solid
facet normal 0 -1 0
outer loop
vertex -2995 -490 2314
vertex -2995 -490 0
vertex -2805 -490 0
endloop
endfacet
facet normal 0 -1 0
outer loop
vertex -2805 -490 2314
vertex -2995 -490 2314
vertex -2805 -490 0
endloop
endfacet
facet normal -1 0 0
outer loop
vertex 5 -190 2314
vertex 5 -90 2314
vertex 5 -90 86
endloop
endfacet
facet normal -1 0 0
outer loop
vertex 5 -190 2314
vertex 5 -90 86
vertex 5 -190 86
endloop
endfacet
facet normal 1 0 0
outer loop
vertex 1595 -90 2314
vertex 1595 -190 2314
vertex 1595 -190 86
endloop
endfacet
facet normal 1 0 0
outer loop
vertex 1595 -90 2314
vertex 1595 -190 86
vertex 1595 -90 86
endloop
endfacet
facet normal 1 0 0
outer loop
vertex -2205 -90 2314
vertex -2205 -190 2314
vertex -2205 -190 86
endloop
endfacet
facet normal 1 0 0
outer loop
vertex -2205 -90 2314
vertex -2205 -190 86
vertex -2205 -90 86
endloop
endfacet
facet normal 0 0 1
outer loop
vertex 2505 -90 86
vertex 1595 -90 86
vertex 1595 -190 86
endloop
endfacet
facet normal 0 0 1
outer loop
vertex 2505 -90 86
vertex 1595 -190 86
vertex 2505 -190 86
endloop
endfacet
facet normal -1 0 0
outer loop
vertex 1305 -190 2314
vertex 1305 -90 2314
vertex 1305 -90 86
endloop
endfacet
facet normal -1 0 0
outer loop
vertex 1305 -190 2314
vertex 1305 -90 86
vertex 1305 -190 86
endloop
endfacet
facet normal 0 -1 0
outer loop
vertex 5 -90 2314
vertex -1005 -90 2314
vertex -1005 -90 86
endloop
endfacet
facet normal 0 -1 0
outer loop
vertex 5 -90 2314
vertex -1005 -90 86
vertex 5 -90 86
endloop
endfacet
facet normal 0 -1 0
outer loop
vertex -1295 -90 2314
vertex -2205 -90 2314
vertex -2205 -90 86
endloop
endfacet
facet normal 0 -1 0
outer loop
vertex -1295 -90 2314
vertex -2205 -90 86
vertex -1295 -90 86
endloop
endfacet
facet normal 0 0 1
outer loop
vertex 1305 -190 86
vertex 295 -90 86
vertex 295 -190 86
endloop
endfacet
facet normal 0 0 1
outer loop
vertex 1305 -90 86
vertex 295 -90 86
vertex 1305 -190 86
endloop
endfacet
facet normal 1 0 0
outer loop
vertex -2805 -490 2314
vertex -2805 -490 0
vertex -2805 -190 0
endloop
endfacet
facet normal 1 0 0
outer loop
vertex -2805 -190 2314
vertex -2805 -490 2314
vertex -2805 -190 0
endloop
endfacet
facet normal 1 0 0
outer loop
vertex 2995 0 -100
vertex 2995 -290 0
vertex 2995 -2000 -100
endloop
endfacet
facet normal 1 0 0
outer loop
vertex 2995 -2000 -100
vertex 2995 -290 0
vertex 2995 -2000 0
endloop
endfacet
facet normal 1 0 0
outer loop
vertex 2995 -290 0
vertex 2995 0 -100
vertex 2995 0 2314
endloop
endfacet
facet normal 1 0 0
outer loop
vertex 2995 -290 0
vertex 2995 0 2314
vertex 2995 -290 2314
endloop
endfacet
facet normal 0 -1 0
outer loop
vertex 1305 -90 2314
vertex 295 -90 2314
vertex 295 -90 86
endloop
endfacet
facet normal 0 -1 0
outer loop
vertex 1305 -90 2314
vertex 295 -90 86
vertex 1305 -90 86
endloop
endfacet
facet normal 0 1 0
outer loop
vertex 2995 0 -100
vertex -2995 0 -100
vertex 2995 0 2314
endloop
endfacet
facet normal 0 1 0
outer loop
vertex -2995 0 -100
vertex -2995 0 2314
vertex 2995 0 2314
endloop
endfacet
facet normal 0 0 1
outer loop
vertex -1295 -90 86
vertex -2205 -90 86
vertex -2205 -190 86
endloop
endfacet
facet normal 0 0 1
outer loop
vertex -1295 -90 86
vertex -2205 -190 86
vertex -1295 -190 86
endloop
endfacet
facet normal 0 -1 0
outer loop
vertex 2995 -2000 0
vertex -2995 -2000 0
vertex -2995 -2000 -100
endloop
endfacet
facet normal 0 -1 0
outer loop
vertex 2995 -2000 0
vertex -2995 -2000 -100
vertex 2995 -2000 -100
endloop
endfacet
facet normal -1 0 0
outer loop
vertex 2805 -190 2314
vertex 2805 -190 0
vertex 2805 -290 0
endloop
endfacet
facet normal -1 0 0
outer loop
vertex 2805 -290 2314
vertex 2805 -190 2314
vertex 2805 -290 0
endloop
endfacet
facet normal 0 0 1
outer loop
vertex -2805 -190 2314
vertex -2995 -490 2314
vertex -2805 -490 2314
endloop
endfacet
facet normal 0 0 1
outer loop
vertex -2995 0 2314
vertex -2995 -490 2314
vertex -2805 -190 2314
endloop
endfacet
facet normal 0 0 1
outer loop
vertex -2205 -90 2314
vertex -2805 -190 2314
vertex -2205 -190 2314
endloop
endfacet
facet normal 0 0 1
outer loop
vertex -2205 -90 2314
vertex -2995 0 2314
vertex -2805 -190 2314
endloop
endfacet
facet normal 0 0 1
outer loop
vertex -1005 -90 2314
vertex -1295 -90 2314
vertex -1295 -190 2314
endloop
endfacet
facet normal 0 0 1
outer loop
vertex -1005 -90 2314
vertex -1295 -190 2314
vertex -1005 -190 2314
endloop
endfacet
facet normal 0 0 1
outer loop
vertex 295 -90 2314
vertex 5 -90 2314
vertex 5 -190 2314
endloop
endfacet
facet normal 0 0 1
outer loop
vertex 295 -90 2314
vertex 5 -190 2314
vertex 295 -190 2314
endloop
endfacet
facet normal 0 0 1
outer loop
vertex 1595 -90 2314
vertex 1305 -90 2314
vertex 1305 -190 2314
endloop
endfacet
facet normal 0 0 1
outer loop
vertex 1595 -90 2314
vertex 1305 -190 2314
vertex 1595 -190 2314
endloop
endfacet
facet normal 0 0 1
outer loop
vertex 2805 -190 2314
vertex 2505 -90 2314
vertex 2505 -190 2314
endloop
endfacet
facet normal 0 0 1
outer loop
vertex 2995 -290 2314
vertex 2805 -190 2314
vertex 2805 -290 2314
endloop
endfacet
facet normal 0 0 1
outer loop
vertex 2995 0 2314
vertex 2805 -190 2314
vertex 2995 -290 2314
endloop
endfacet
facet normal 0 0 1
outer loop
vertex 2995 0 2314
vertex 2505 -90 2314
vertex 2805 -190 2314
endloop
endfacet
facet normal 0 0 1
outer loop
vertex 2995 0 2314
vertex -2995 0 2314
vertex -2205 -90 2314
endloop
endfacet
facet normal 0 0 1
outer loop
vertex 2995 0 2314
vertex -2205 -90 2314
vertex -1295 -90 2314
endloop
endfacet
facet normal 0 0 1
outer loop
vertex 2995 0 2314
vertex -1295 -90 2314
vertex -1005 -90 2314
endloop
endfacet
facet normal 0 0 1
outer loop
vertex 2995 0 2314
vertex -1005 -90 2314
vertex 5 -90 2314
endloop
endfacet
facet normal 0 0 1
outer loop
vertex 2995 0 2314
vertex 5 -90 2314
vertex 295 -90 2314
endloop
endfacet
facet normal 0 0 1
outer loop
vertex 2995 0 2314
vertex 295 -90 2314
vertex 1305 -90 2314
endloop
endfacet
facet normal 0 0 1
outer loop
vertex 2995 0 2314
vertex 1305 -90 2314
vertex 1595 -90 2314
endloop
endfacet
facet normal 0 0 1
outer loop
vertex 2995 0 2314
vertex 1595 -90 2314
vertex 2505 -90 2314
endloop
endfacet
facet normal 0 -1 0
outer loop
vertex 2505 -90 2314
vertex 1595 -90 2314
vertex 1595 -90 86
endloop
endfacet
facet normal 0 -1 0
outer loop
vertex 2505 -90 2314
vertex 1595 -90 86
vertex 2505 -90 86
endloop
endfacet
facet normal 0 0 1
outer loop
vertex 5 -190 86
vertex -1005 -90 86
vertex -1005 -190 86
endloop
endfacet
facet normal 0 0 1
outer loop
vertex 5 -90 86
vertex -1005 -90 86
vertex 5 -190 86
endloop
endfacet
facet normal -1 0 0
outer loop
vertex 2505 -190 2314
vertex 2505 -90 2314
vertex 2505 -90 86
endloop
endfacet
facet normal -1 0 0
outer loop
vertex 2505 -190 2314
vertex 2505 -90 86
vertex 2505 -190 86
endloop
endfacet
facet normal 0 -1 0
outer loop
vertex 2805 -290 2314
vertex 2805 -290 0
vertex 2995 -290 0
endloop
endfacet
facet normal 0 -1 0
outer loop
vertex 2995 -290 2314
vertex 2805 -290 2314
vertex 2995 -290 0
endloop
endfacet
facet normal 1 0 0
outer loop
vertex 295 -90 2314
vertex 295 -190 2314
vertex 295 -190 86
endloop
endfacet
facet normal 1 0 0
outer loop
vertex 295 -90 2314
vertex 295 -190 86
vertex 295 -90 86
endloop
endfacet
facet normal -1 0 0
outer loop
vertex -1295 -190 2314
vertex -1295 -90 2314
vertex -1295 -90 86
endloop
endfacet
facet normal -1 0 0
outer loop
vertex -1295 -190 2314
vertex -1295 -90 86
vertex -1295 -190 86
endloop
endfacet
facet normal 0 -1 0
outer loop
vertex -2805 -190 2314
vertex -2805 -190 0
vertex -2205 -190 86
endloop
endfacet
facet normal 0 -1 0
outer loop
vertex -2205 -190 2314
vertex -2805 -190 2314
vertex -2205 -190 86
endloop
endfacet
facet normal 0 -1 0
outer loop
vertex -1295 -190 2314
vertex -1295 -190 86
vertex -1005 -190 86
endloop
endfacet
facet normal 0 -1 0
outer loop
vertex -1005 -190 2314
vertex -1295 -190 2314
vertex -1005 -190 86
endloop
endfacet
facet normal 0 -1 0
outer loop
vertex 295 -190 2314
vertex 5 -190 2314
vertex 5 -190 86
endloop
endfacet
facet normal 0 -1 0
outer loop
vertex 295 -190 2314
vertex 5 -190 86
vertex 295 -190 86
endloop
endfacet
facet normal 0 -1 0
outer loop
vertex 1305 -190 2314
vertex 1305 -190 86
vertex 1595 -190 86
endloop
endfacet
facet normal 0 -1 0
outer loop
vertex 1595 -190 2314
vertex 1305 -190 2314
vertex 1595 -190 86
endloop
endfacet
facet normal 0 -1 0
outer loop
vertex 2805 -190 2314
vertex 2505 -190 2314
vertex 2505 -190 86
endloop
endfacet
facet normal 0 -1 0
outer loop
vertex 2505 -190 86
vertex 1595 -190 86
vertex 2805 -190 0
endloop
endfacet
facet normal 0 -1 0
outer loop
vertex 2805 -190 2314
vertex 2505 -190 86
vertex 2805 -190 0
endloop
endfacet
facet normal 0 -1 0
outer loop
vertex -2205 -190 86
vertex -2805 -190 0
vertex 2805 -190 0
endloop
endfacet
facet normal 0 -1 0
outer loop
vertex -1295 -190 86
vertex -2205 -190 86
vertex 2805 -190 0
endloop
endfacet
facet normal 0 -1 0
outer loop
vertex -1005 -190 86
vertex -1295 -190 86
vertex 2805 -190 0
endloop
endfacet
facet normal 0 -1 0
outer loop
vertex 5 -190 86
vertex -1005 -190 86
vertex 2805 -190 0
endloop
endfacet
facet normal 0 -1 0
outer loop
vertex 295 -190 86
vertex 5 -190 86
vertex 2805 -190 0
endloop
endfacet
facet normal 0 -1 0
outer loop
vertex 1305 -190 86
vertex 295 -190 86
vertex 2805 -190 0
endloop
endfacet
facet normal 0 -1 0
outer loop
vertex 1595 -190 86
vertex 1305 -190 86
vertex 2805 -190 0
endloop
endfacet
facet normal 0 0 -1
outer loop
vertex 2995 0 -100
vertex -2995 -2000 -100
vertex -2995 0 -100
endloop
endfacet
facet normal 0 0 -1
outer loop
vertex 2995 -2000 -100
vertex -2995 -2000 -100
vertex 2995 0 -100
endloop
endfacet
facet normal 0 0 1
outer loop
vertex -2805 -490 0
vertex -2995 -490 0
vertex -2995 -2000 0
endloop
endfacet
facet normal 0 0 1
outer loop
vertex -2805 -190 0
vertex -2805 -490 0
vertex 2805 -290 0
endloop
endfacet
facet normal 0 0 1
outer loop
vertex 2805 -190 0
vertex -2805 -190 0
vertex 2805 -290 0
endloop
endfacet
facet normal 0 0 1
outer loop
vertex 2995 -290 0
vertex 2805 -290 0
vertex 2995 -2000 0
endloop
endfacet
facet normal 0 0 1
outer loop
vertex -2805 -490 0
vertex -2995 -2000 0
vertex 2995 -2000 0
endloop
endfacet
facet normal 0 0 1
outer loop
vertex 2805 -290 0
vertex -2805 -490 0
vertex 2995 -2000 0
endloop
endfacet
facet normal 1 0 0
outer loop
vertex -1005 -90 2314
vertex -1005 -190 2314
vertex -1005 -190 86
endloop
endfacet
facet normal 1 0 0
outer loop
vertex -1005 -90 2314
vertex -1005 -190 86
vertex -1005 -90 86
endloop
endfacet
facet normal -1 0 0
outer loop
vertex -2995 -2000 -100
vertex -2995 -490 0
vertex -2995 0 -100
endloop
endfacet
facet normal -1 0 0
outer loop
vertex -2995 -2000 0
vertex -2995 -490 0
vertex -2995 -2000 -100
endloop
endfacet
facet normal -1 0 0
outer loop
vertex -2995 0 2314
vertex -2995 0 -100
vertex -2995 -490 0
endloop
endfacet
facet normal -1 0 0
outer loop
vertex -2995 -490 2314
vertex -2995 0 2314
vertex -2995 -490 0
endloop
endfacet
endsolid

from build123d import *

# Parameters (mm, degrees)
F1_DEPTH = 2314
F2_W     = 5990
F2_H     = 2000
F3_DEPTH = 100
F4_W     = 910
F4_H     = 100
F4_W_2   = 1010
F5_DEPTH = 86


with BuildPart() as f1:
    # F0 (on Top) → F1 (new body)
    with BuildSketch(Plane.XY):
        Polygon((2995, -290), (2995, 0), (-2995, 0), (-2995, -490), (-2805, -490), (-2805, -190), (-2205, -190), (-2205, -90), (-1295, -90), (-1295, -190), (-1005, -190), (-1005, -90), (5, -90), (5, -190), (295, -190), (295, -90), (1305, -90), (1305, -190), (1595, -190), (1595, -90), (2505, -90), (2505, -190), (2805, -190), (2805, -290), align=None)
    extrude(amount=F1_DEPTH)

    # F2 (on face) → F3 (join)
    with BuildSketch(Plane(origin=(0, 0, 0), x_dir=(1, 0, 0), z_dir=(0, 0, -1))):
        with Locations((0, 1000)):
            Rectangle(F2_W, F2_H)
    extrude(amount=F3_DEPTH)

    # F4 (on face) → F5 (join)
    with BuildSketch(Plane.XY):
        with Locations((-1750, -140)):
            Rectangle(F4_W, F4_H)
        with Locations((-500, -140)):
            Rectangle(F4_W_2, F4_H)
        with Locations((800, -140)):
            Rectangle(F4_W_2, F4_H)
        with Locations((2050, -140)):
            Rectangle(F4_W, F4_H)
    extrude(amount=F5_DEPTH)


solid = f1.part
